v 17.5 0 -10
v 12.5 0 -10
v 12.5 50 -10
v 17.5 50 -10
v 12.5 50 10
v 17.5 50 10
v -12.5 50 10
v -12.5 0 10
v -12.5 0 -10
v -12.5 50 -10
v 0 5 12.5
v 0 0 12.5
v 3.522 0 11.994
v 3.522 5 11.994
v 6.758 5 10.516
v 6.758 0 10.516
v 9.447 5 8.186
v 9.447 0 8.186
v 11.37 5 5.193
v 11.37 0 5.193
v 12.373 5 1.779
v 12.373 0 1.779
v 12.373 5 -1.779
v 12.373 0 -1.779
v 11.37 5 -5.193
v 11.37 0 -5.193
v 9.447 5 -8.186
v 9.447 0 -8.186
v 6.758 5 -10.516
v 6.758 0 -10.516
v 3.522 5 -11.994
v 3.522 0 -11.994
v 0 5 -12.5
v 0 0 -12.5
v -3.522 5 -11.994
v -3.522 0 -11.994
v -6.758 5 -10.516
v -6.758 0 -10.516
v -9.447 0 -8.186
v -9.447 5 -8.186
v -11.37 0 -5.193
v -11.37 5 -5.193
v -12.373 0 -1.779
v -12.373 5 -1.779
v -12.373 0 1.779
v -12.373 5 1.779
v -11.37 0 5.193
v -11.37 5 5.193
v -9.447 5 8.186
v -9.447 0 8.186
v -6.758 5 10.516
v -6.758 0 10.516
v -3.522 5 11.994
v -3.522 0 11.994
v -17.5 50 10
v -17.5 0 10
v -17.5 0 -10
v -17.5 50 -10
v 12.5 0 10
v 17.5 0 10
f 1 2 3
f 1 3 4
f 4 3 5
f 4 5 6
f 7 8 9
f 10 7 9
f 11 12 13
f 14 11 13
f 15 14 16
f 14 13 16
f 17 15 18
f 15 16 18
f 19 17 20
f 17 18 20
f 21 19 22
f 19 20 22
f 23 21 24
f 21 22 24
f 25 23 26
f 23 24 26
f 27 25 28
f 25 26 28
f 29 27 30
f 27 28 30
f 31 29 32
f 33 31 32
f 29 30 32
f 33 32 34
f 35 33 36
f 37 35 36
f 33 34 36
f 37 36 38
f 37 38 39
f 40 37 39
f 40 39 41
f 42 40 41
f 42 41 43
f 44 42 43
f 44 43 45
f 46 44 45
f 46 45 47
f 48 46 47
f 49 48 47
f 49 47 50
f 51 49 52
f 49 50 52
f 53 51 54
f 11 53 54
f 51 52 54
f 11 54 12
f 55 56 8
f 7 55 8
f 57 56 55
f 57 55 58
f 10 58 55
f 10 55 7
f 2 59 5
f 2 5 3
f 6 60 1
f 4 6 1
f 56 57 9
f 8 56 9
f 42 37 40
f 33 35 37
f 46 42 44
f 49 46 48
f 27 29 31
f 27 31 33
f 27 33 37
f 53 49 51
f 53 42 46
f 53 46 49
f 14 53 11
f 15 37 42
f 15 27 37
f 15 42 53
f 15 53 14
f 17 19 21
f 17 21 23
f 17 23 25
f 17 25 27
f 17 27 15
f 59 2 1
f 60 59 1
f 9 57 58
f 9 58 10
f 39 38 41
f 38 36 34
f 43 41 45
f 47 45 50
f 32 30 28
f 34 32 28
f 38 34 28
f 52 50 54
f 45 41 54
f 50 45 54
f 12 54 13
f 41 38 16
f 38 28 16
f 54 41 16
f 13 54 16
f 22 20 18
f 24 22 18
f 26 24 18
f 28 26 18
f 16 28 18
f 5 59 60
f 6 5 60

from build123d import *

# Parameters (mm, degrees)
SKETCH1_R             = 12.5
BOSS_EXTRUDE1_DEPTH   = 5
SKETCH2_W             = 5
SKETCH2_H             = 20
BOSS_EXTRUDE2_DEPTH   = 50
BOSS_EXTRUDE2_2_DEPTH = 50


with BuildPart() as part:
    # Sketch1 → Boss-Extrude1 (new body)
    with BuildSketch(Plane(origin=(0, 0, 0), x_dir=(1, 0, 0), z_dir=(0, 1, 0))):
        with Locations(Location((0, 0, 0), (0, 0, 270))):
            Circle(SKETCH1_R)
    extrude(amount=BOSS_EXTRUDE1_DEPTH)


with BuildPart() as body_2:
    # Sketch2 → Boss-Extrude2 (new body)
    with BuildSketch(Plane(origin=(0, 0, 0), x_dir=(1, 0, 0), z_dir=(0, 1, 0))):
        with Locations((-15, 0)):
            Rectangle(SKETCH2_W, SKETCH2_H)
    extrude(amount=BOSS_EXTRUDE2_DEPTH)


with BuildPart() as body_3:
    # Sketch2 → Boss-Extrude2 2 (new body)
    with BuildSketch(Plane(origin=(0, 0, 0), x_dir=(1, 0, 0), z_dir=(0, 1, 0))):
        with Locations((15, 0)):
            Rectangle(SKETCH2_W, SKETCH2_H)
    extrude(amount=BOSS_EXTRUDE2_2_DEPTH)


solid = Compound([part.part, body_2.part, body_3.part])
